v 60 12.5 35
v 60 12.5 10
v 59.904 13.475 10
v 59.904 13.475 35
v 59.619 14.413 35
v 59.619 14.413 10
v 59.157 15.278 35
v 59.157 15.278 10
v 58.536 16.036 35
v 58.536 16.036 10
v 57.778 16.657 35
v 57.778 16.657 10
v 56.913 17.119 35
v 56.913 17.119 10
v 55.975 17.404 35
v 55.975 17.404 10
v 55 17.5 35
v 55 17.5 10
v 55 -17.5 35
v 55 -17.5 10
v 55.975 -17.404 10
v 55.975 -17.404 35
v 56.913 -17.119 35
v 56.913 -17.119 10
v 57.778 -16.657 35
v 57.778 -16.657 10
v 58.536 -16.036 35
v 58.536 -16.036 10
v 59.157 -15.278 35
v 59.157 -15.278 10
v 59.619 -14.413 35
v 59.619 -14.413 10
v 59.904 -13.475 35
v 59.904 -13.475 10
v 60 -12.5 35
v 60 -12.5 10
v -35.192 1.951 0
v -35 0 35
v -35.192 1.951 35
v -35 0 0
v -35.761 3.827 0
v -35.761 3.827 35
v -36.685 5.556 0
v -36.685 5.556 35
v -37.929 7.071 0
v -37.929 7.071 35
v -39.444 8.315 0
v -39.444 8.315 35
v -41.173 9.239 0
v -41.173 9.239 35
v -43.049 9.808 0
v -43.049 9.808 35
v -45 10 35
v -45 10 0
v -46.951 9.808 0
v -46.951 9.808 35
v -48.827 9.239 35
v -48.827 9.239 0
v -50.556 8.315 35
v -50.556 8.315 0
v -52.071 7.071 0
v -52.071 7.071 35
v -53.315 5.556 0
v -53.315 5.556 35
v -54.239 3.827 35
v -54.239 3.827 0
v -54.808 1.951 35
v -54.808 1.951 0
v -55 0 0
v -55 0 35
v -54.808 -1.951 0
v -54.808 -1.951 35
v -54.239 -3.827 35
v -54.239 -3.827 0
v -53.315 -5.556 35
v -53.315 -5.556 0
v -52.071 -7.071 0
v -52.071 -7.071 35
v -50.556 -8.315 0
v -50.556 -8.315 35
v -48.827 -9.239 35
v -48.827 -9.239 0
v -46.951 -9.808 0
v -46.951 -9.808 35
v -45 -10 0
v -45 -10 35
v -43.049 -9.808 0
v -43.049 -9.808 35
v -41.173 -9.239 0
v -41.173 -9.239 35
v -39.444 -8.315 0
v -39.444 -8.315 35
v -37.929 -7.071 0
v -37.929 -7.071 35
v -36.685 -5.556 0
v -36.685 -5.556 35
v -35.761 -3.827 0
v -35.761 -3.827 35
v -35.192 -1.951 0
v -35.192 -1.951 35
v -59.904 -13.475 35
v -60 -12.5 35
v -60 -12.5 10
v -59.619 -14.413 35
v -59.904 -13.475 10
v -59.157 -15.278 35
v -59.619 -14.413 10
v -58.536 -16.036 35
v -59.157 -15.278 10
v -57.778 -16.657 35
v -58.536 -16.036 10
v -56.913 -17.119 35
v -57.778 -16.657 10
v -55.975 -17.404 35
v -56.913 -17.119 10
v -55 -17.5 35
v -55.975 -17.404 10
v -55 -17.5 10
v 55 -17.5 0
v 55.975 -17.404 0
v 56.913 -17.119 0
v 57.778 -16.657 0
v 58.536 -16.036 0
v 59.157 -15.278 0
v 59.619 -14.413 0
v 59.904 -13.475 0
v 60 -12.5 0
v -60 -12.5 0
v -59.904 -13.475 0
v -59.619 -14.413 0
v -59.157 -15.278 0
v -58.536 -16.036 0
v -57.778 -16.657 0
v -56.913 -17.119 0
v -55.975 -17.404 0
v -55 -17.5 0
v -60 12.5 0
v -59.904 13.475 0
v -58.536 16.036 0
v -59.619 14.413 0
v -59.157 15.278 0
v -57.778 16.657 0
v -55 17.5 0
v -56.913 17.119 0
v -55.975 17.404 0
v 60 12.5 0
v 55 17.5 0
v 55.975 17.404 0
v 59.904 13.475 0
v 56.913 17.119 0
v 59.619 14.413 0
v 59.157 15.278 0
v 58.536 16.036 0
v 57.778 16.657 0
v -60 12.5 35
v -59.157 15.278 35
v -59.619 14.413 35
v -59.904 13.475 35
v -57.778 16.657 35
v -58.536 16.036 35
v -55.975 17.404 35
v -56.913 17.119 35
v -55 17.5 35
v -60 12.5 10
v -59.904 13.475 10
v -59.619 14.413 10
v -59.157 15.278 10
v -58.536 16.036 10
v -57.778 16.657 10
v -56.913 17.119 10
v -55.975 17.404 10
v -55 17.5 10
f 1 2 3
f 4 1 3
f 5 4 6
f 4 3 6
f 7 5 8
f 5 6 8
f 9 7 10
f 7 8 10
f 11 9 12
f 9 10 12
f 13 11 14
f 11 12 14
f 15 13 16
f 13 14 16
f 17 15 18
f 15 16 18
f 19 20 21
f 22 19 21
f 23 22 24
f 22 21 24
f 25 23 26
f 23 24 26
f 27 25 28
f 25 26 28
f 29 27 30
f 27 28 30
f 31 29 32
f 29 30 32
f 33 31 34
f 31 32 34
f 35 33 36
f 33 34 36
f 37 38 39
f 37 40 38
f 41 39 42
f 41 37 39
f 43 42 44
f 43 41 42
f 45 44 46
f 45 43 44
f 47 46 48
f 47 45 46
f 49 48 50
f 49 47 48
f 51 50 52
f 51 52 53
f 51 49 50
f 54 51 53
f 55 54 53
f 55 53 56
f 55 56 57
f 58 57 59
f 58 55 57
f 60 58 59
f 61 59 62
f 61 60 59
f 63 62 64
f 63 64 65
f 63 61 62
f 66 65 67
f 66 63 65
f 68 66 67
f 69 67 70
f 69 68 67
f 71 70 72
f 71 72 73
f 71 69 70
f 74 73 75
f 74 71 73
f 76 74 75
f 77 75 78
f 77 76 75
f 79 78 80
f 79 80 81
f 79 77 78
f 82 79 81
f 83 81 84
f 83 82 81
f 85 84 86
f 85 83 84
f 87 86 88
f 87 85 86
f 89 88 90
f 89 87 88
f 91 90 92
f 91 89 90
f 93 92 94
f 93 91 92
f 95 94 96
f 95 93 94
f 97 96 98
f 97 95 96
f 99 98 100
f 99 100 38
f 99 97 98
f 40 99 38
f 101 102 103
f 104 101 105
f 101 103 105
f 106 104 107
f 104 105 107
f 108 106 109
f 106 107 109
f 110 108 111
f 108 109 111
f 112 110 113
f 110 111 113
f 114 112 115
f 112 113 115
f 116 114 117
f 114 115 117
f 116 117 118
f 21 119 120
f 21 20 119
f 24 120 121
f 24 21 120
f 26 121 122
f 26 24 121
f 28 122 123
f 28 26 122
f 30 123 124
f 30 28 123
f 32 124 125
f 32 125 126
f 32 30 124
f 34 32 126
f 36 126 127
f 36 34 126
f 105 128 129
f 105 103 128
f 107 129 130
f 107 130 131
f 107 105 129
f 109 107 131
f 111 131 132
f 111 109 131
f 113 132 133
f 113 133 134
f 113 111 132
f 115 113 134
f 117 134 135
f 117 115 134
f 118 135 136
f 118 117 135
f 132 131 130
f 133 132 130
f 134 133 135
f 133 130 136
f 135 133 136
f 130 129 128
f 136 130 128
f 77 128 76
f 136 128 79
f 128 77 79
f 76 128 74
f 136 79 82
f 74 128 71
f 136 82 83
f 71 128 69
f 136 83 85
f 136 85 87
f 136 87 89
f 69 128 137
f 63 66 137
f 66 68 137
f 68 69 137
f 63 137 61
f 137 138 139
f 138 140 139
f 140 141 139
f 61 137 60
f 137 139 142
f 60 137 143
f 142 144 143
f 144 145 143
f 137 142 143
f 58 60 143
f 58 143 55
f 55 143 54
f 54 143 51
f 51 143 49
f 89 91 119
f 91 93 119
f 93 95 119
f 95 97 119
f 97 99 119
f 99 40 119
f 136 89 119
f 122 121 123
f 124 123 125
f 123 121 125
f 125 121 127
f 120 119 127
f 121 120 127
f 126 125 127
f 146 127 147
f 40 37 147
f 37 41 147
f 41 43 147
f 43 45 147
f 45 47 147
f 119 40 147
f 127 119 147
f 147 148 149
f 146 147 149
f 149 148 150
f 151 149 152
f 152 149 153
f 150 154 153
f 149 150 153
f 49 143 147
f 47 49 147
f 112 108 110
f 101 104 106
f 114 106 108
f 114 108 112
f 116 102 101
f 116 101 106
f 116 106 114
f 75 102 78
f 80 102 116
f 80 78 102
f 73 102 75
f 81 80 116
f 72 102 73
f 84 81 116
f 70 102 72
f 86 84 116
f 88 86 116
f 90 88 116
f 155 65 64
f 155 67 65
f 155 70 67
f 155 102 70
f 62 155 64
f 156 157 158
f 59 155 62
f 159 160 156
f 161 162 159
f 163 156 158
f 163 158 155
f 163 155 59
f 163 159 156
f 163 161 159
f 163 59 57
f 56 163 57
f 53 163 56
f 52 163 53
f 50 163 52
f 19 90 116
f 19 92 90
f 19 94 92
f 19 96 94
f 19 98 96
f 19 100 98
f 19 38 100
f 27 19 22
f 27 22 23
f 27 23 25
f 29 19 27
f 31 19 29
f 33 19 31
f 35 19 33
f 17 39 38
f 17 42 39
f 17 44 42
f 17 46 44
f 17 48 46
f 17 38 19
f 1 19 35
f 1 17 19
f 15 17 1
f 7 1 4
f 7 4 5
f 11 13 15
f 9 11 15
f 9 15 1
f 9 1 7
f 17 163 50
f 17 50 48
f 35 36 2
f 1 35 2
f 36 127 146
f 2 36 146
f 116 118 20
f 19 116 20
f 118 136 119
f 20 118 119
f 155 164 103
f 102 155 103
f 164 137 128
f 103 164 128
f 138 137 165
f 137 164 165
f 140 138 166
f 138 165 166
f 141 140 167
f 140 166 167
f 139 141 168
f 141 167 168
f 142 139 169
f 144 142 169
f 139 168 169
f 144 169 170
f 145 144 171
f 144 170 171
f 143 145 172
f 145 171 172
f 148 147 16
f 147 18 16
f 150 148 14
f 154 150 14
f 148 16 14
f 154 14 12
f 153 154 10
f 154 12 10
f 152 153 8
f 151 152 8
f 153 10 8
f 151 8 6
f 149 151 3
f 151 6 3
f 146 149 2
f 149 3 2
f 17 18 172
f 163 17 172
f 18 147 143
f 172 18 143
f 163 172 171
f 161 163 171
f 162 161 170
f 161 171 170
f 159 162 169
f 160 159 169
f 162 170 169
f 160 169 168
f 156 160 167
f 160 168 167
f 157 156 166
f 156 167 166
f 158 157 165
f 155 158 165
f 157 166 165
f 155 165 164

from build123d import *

# Parameters (mm, degrees)
F0_W     = 120
F0_H     = 35
F0_R     = 10
F1_DEPTH = 10
F2_R     = 5
F3_R     = 10
F4_DEPTH = 25


with BuildPart() as f1:
    # F0 (on Top) → F1 (new body)
    with BuildSketch(Plane.XY):
        Rectangle(F0_W, F0_H)
        with Locations((-45, 0)):
            Circle(F0_R, mode=Mode.SUBTRACT)
    extrude(amount=F1_DEPTH)

    # F2
    f2_edges = [f1.edges().sort_by_distance(p)[0] for p in [
        (-60, -17.5, 5),
        (60, -17.5, 5),
        (60, 17.5, 5),
        (-60, 17.5, 5),
    ]]
    fillet(f2_edges, radius=F2_R)

    # F3 (on face) → F4 (join)
    with BuildSketch(Plane.XY.offset(10)):
        with BuildLine():
            ThreePointArc((55, -17.5), (58.535534, -16.035534), (60, -12.5))
            Line((60, -12.5), (60, 12.5))
            ThreePointArc((60, 12.5), (58.535534, 16.035534), (55, 17.5))
            Line((55, 17.5), (-55, 17.5))
            ThreePointArc((-55, 17.5), (-58.535534, 16.035534), (-60, 12.5))
            Line((-60, 12.5), (-60, -12.5))
            ThreePointArc((-60, -12.5), (-58.535534, -16.035534), (-55, -17.5))
            Line((-55, -17.5), (55, -17.5))
        make_face()
        with Locations((-45, 0)):
            Circle(F3_R, mode=Mode.SUBTRACT)
    extrude(amount=F4_DEPTH)


solid = f1.part
